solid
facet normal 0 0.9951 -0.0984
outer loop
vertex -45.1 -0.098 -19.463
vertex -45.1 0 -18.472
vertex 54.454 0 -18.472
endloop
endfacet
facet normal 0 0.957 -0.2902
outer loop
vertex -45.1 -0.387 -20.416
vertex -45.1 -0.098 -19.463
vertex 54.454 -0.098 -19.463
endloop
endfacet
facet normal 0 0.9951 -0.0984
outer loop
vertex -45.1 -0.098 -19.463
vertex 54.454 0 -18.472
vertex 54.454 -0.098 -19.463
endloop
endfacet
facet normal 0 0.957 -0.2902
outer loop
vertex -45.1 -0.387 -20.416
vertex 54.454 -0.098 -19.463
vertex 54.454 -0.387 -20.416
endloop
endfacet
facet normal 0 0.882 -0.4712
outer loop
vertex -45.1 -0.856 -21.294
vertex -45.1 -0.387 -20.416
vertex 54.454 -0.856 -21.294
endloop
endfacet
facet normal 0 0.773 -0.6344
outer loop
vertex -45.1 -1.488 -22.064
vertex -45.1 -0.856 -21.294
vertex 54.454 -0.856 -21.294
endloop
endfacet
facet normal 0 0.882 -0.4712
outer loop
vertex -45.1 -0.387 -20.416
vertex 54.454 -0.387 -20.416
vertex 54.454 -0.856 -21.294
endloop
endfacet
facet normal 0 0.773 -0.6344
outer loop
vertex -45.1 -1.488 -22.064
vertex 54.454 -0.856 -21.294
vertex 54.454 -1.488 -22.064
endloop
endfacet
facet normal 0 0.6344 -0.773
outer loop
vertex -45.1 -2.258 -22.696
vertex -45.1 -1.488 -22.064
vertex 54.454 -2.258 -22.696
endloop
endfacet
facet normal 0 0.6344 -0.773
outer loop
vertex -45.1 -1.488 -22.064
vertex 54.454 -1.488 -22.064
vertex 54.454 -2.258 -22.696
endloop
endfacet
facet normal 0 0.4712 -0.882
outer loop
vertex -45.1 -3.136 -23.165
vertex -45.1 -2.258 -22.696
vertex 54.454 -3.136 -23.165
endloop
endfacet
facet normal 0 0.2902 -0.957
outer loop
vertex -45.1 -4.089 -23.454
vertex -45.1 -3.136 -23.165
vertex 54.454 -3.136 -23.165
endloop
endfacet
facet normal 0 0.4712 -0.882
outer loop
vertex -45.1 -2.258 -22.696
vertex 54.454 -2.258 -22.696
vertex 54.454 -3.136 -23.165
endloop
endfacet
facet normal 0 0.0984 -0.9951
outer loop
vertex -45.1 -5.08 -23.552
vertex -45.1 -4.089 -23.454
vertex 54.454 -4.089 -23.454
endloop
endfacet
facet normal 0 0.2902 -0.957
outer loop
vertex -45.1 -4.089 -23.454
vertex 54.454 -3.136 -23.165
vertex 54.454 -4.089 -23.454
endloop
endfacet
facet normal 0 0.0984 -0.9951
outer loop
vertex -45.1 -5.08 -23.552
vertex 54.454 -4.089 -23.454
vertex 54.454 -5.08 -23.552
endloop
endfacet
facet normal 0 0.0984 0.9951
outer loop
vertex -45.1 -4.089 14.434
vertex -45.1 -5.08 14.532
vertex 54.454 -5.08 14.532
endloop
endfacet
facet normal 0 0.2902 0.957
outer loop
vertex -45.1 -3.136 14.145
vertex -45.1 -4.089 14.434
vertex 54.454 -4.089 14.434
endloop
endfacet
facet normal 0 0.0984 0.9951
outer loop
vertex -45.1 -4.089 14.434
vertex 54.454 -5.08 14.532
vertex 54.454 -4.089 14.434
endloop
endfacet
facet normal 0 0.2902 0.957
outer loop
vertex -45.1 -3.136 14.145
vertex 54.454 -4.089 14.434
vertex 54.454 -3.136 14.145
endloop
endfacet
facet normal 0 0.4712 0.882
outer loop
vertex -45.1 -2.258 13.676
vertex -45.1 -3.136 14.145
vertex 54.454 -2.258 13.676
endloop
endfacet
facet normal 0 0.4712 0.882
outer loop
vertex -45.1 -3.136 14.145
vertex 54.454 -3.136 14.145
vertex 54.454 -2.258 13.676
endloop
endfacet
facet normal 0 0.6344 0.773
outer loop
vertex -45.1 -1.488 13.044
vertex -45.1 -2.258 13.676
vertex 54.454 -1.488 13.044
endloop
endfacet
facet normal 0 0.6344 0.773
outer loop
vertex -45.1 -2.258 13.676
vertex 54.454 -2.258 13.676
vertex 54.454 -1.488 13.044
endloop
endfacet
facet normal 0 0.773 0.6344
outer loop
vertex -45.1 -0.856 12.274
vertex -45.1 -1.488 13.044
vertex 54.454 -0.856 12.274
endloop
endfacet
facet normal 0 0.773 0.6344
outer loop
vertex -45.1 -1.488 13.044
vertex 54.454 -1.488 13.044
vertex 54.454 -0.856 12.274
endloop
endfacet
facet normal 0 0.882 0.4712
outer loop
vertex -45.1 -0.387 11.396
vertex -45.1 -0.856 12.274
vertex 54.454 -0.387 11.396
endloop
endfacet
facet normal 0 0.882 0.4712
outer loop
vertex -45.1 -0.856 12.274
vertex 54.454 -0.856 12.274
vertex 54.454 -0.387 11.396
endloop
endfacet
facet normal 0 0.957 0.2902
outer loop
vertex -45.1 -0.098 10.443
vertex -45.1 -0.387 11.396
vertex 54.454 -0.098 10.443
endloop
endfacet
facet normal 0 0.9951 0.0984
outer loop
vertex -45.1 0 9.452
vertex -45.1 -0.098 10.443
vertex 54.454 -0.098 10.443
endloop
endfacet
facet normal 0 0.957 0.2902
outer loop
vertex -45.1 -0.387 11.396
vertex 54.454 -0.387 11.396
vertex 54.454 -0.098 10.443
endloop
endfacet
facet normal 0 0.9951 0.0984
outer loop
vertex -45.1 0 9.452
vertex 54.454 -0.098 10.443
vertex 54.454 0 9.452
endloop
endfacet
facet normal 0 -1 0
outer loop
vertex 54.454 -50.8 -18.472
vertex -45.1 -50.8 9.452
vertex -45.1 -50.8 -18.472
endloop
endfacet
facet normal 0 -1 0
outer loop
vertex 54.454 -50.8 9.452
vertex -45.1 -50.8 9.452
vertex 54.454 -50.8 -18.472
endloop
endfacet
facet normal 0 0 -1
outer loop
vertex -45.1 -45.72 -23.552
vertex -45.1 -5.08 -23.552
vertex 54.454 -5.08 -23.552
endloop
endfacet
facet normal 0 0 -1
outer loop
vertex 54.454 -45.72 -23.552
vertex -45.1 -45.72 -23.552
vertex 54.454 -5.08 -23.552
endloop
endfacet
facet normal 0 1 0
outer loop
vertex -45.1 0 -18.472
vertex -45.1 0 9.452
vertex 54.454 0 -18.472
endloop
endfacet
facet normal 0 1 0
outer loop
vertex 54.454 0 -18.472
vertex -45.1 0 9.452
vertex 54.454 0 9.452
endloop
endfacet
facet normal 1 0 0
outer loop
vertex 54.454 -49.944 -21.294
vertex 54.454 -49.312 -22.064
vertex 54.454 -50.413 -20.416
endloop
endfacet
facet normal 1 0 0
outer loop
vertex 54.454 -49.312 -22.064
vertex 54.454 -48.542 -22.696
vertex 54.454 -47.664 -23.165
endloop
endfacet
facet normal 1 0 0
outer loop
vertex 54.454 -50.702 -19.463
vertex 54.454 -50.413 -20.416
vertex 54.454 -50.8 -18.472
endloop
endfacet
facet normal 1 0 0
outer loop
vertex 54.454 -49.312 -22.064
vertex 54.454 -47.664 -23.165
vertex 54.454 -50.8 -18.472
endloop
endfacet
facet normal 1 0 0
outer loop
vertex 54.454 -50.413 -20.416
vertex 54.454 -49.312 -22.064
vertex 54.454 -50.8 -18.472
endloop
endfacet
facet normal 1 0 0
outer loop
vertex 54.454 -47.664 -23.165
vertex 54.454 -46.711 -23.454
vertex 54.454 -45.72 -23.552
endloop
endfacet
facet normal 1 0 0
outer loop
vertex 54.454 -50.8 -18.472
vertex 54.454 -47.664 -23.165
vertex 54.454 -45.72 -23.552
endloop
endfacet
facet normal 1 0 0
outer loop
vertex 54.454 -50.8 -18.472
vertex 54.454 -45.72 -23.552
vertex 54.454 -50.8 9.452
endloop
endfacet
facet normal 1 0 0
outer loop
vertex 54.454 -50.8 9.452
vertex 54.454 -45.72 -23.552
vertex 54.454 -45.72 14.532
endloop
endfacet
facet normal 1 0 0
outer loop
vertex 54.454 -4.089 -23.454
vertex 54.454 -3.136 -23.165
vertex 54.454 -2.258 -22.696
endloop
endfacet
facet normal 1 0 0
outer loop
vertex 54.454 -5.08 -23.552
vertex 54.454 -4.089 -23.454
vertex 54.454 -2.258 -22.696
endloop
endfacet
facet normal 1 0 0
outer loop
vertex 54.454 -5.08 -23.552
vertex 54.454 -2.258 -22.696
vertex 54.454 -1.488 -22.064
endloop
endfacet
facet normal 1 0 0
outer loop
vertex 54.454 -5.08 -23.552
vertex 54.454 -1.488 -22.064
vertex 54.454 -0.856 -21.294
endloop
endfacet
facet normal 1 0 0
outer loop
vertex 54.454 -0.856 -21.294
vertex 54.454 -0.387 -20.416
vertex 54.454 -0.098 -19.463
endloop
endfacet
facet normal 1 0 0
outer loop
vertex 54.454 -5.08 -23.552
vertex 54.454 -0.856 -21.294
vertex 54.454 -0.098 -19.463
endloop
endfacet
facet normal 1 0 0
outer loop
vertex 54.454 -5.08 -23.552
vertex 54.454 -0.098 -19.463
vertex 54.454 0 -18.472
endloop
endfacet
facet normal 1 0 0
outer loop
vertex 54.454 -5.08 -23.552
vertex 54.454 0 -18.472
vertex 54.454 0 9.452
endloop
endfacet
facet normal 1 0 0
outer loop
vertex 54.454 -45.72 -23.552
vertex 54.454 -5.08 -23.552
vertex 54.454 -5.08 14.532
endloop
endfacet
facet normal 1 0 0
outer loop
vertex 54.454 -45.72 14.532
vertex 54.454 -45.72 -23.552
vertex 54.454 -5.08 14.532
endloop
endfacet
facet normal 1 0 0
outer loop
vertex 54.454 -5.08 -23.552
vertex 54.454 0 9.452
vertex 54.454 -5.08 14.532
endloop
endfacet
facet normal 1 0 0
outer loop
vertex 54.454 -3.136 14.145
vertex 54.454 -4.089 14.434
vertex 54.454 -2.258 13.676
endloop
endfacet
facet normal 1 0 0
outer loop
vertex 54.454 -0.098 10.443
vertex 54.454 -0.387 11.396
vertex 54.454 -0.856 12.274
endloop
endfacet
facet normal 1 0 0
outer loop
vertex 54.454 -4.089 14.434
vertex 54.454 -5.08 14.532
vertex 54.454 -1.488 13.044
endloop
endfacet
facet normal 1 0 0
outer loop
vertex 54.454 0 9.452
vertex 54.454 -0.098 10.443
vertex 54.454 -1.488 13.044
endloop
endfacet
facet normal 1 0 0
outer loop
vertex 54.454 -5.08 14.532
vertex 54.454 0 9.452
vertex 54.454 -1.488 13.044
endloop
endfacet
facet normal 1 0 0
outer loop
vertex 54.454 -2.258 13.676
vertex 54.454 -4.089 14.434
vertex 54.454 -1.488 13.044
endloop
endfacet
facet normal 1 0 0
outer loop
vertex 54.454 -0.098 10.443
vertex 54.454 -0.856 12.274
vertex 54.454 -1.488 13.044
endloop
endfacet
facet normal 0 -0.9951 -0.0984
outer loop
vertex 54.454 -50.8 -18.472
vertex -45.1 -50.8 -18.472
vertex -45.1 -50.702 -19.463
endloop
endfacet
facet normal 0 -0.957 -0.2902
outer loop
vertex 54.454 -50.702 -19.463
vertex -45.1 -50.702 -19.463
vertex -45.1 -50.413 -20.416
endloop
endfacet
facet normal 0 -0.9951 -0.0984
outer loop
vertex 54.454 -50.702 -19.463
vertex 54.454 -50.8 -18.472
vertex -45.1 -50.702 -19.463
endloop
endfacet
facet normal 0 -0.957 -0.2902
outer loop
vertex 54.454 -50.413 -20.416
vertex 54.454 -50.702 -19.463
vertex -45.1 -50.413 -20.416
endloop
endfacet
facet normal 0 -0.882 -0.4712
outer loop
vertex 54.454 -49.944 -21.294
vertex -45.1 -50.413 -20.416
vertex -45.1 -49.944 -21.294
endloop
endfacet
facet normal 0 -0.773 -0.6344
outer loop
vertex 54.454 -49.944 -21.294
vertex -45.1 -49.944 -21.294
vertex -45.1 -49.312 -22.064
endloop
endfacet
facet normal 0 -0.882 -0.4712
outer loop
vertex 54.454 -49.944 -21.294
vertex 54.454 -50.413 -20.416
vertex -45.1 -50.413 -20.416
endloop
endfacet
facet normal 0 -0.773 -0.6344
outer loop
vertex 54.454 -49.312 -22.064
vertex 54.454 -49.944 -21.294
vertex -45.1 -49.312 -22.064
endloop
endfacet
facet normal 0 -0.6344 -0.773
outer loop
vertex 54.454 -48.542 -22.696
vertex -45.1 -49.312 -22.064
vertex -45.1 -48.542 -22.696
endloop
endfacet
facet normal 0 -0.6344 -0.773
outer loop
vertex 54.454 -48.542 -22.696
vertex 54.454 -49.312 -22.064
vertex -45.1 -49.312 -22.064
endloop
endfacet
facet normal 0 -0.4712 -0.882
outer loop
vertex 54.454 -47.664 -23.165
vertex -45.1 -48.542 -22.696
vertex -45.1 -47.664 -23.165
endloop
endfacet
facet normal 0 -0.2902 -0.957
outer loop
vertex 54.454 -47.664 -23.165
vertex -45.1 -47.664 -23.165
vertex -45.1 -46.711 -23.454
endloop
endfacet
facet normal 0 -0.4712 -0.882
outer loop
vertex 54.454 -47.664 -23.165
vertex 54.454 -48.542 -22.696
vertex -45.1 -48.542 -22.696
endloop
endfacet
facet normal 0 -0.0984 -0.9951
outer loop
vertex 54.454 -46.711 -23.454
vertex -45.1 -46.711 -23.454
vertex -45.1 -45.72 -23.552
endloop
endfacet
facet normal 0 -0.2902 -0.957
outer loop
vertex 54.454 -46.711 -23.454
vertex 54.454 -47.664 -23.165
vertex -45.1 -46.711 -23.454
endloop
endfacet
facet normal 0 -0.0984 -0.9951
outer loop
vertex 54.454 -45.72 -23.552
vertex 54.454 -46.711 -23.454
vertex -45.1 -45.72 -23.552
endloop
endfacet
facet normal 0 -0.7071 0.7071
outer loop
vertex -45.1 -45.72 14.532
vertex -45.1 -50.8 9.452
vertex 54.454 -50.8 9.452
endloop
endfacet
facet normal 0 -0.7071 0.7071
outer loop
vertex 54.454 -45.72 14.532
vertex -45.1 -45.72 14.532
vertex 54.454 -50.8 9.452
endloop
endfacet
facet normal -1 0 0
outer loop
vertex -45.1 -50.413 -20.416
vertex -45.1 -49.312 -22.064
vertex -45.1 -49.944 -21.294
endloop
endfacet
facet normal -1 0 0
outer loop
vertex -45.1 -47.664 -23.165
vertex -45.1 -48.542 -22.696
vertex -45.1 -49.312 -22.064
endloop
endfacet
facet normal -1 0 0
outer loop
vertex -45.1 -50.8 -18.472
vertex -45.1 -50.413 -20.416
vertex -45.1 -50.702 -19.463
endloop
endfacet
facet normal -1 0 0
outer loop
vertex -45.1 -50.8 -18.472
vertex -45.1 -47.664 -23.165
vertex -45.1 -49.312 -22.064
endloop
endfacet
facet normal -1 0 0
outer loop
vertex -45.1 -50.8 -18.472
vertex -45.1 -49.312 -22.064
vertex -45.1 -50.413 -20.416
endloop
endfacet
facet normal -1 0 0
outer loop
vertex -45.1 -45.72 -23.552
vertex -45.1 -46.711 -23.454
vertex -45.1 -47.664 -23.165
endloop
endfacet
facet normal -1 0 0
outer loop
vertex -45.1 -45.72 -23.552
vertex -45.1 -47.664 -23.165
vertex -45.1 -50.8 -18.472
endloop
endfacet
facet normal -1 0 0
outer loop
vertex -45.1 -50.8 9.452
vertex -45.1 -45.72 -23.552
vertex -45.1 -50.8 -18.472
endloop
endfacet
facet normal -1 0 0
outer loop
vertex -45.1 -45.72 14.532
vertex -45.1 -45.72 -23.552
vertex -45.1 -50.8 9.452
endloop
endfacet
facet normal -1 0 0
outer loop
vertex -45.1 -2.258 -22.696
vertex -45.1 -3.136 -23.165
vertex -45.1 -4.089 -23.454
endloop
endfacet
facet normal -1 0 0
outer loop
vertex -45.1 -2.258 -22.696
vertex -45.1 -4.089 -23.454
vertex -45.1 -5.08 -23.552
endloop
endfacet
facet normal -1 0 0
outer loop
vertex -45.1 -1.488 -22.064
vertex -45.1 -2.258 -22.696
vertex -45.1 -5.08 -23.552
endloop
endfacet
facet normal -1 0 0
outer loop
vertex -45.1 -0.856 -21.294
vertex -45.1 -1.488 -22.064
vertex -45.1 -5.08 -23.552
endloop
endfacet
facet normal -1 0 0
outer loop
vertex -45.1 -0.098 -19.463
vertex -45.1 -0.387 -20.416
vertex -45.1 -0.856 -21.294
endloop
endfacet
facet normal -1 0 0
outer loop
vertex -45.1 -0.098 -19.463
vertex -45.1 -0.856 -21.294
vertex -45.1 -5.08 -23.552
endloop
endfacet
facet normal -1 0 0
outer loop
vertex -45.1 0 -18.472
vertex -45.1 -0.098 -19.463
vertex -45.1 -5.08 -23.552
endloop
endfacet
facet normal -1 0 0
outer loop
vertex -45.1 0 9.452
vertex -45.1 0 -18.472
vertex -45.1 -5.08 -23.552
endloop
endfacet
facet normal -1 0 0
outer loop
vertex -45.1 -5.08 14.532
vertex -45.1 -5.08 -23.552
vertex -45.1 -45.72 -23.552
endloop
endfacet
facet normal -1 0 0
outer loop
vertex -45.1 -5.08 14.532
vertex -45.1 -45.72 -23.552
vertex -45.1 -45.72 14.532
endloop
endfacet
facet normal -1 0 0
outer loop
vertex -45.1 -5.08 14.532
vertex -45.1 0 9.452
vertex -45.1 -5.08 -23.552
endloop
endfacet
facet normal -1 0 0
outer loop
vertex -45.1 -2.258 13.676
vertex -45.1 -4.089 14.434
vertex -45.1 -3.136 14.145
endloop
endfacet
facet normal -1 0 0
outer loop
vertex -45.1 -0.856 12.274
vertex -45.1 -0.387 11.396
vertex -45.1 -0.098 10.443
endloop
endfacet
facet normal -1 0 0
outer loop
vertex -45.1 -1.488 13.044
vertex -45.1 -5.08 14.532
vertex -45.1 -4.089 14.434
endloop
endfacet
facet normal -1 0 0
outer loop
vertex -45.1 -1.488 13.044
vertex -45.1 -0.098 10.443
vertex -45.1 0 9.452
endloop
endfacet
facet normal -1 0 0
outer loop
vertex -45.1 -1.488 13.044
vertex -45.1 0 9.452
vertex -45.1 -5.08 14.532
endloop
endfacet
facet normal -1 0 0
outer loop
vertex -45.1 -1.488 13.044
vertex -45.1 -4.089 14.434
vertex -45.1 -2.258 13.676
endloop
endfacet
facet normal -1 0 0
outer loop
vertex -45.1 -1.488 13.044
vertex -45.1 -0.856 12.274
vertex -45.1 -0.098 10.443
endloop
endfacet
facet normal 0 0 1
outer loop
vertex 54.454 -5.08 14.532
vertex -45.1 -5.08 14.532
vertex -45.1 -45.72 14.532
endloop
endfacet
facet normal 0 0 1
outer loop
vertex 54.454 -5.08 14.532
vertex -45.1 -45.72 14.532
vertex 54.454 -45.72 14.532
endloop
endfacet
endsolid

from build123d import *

# Parameters (mm, degrees)
F0_W     = 99.553153
F0_H     = 38.084091
F1_DEPTH = 50.8
F2_SIZE  = 5.08
F3_R     = 5.08
F4_R     = 5.08


with BuildPart() as f1:
    # F0 (on Front) → F1 (new body)
    with BuildSketch(Plane.XZ):
        with Locations((4.676994, -4.509959)):
            Rectangle(F0_W, F0_H)
    extrude(amount=F1_DEPTH)

    # F2
    f2_edges = [f1.edges().sort_by_distance(p)[0] for p in [
        (4.676994, -50.8, 14.532087),
    ]]
    chamfer(f2_edges, length=F2_SIZE)

    # F3
    f3_edges = [f1.edges().sort_by_distance(p)[0] for p in [
        (4.676994, 0, 14.532087),
    ]]
    fillet(f3_edges, radius=F3_R)

    # F4
    f4_edges = [f1.edges().sort_by_distance(p)[0] for p in [
        (4.676994, 0, -23.552004),
        (4.676994, -50.8, -23.552004),
    ]]
    fillet(f4_edges, radius=F4_R)


solid = f1.part
